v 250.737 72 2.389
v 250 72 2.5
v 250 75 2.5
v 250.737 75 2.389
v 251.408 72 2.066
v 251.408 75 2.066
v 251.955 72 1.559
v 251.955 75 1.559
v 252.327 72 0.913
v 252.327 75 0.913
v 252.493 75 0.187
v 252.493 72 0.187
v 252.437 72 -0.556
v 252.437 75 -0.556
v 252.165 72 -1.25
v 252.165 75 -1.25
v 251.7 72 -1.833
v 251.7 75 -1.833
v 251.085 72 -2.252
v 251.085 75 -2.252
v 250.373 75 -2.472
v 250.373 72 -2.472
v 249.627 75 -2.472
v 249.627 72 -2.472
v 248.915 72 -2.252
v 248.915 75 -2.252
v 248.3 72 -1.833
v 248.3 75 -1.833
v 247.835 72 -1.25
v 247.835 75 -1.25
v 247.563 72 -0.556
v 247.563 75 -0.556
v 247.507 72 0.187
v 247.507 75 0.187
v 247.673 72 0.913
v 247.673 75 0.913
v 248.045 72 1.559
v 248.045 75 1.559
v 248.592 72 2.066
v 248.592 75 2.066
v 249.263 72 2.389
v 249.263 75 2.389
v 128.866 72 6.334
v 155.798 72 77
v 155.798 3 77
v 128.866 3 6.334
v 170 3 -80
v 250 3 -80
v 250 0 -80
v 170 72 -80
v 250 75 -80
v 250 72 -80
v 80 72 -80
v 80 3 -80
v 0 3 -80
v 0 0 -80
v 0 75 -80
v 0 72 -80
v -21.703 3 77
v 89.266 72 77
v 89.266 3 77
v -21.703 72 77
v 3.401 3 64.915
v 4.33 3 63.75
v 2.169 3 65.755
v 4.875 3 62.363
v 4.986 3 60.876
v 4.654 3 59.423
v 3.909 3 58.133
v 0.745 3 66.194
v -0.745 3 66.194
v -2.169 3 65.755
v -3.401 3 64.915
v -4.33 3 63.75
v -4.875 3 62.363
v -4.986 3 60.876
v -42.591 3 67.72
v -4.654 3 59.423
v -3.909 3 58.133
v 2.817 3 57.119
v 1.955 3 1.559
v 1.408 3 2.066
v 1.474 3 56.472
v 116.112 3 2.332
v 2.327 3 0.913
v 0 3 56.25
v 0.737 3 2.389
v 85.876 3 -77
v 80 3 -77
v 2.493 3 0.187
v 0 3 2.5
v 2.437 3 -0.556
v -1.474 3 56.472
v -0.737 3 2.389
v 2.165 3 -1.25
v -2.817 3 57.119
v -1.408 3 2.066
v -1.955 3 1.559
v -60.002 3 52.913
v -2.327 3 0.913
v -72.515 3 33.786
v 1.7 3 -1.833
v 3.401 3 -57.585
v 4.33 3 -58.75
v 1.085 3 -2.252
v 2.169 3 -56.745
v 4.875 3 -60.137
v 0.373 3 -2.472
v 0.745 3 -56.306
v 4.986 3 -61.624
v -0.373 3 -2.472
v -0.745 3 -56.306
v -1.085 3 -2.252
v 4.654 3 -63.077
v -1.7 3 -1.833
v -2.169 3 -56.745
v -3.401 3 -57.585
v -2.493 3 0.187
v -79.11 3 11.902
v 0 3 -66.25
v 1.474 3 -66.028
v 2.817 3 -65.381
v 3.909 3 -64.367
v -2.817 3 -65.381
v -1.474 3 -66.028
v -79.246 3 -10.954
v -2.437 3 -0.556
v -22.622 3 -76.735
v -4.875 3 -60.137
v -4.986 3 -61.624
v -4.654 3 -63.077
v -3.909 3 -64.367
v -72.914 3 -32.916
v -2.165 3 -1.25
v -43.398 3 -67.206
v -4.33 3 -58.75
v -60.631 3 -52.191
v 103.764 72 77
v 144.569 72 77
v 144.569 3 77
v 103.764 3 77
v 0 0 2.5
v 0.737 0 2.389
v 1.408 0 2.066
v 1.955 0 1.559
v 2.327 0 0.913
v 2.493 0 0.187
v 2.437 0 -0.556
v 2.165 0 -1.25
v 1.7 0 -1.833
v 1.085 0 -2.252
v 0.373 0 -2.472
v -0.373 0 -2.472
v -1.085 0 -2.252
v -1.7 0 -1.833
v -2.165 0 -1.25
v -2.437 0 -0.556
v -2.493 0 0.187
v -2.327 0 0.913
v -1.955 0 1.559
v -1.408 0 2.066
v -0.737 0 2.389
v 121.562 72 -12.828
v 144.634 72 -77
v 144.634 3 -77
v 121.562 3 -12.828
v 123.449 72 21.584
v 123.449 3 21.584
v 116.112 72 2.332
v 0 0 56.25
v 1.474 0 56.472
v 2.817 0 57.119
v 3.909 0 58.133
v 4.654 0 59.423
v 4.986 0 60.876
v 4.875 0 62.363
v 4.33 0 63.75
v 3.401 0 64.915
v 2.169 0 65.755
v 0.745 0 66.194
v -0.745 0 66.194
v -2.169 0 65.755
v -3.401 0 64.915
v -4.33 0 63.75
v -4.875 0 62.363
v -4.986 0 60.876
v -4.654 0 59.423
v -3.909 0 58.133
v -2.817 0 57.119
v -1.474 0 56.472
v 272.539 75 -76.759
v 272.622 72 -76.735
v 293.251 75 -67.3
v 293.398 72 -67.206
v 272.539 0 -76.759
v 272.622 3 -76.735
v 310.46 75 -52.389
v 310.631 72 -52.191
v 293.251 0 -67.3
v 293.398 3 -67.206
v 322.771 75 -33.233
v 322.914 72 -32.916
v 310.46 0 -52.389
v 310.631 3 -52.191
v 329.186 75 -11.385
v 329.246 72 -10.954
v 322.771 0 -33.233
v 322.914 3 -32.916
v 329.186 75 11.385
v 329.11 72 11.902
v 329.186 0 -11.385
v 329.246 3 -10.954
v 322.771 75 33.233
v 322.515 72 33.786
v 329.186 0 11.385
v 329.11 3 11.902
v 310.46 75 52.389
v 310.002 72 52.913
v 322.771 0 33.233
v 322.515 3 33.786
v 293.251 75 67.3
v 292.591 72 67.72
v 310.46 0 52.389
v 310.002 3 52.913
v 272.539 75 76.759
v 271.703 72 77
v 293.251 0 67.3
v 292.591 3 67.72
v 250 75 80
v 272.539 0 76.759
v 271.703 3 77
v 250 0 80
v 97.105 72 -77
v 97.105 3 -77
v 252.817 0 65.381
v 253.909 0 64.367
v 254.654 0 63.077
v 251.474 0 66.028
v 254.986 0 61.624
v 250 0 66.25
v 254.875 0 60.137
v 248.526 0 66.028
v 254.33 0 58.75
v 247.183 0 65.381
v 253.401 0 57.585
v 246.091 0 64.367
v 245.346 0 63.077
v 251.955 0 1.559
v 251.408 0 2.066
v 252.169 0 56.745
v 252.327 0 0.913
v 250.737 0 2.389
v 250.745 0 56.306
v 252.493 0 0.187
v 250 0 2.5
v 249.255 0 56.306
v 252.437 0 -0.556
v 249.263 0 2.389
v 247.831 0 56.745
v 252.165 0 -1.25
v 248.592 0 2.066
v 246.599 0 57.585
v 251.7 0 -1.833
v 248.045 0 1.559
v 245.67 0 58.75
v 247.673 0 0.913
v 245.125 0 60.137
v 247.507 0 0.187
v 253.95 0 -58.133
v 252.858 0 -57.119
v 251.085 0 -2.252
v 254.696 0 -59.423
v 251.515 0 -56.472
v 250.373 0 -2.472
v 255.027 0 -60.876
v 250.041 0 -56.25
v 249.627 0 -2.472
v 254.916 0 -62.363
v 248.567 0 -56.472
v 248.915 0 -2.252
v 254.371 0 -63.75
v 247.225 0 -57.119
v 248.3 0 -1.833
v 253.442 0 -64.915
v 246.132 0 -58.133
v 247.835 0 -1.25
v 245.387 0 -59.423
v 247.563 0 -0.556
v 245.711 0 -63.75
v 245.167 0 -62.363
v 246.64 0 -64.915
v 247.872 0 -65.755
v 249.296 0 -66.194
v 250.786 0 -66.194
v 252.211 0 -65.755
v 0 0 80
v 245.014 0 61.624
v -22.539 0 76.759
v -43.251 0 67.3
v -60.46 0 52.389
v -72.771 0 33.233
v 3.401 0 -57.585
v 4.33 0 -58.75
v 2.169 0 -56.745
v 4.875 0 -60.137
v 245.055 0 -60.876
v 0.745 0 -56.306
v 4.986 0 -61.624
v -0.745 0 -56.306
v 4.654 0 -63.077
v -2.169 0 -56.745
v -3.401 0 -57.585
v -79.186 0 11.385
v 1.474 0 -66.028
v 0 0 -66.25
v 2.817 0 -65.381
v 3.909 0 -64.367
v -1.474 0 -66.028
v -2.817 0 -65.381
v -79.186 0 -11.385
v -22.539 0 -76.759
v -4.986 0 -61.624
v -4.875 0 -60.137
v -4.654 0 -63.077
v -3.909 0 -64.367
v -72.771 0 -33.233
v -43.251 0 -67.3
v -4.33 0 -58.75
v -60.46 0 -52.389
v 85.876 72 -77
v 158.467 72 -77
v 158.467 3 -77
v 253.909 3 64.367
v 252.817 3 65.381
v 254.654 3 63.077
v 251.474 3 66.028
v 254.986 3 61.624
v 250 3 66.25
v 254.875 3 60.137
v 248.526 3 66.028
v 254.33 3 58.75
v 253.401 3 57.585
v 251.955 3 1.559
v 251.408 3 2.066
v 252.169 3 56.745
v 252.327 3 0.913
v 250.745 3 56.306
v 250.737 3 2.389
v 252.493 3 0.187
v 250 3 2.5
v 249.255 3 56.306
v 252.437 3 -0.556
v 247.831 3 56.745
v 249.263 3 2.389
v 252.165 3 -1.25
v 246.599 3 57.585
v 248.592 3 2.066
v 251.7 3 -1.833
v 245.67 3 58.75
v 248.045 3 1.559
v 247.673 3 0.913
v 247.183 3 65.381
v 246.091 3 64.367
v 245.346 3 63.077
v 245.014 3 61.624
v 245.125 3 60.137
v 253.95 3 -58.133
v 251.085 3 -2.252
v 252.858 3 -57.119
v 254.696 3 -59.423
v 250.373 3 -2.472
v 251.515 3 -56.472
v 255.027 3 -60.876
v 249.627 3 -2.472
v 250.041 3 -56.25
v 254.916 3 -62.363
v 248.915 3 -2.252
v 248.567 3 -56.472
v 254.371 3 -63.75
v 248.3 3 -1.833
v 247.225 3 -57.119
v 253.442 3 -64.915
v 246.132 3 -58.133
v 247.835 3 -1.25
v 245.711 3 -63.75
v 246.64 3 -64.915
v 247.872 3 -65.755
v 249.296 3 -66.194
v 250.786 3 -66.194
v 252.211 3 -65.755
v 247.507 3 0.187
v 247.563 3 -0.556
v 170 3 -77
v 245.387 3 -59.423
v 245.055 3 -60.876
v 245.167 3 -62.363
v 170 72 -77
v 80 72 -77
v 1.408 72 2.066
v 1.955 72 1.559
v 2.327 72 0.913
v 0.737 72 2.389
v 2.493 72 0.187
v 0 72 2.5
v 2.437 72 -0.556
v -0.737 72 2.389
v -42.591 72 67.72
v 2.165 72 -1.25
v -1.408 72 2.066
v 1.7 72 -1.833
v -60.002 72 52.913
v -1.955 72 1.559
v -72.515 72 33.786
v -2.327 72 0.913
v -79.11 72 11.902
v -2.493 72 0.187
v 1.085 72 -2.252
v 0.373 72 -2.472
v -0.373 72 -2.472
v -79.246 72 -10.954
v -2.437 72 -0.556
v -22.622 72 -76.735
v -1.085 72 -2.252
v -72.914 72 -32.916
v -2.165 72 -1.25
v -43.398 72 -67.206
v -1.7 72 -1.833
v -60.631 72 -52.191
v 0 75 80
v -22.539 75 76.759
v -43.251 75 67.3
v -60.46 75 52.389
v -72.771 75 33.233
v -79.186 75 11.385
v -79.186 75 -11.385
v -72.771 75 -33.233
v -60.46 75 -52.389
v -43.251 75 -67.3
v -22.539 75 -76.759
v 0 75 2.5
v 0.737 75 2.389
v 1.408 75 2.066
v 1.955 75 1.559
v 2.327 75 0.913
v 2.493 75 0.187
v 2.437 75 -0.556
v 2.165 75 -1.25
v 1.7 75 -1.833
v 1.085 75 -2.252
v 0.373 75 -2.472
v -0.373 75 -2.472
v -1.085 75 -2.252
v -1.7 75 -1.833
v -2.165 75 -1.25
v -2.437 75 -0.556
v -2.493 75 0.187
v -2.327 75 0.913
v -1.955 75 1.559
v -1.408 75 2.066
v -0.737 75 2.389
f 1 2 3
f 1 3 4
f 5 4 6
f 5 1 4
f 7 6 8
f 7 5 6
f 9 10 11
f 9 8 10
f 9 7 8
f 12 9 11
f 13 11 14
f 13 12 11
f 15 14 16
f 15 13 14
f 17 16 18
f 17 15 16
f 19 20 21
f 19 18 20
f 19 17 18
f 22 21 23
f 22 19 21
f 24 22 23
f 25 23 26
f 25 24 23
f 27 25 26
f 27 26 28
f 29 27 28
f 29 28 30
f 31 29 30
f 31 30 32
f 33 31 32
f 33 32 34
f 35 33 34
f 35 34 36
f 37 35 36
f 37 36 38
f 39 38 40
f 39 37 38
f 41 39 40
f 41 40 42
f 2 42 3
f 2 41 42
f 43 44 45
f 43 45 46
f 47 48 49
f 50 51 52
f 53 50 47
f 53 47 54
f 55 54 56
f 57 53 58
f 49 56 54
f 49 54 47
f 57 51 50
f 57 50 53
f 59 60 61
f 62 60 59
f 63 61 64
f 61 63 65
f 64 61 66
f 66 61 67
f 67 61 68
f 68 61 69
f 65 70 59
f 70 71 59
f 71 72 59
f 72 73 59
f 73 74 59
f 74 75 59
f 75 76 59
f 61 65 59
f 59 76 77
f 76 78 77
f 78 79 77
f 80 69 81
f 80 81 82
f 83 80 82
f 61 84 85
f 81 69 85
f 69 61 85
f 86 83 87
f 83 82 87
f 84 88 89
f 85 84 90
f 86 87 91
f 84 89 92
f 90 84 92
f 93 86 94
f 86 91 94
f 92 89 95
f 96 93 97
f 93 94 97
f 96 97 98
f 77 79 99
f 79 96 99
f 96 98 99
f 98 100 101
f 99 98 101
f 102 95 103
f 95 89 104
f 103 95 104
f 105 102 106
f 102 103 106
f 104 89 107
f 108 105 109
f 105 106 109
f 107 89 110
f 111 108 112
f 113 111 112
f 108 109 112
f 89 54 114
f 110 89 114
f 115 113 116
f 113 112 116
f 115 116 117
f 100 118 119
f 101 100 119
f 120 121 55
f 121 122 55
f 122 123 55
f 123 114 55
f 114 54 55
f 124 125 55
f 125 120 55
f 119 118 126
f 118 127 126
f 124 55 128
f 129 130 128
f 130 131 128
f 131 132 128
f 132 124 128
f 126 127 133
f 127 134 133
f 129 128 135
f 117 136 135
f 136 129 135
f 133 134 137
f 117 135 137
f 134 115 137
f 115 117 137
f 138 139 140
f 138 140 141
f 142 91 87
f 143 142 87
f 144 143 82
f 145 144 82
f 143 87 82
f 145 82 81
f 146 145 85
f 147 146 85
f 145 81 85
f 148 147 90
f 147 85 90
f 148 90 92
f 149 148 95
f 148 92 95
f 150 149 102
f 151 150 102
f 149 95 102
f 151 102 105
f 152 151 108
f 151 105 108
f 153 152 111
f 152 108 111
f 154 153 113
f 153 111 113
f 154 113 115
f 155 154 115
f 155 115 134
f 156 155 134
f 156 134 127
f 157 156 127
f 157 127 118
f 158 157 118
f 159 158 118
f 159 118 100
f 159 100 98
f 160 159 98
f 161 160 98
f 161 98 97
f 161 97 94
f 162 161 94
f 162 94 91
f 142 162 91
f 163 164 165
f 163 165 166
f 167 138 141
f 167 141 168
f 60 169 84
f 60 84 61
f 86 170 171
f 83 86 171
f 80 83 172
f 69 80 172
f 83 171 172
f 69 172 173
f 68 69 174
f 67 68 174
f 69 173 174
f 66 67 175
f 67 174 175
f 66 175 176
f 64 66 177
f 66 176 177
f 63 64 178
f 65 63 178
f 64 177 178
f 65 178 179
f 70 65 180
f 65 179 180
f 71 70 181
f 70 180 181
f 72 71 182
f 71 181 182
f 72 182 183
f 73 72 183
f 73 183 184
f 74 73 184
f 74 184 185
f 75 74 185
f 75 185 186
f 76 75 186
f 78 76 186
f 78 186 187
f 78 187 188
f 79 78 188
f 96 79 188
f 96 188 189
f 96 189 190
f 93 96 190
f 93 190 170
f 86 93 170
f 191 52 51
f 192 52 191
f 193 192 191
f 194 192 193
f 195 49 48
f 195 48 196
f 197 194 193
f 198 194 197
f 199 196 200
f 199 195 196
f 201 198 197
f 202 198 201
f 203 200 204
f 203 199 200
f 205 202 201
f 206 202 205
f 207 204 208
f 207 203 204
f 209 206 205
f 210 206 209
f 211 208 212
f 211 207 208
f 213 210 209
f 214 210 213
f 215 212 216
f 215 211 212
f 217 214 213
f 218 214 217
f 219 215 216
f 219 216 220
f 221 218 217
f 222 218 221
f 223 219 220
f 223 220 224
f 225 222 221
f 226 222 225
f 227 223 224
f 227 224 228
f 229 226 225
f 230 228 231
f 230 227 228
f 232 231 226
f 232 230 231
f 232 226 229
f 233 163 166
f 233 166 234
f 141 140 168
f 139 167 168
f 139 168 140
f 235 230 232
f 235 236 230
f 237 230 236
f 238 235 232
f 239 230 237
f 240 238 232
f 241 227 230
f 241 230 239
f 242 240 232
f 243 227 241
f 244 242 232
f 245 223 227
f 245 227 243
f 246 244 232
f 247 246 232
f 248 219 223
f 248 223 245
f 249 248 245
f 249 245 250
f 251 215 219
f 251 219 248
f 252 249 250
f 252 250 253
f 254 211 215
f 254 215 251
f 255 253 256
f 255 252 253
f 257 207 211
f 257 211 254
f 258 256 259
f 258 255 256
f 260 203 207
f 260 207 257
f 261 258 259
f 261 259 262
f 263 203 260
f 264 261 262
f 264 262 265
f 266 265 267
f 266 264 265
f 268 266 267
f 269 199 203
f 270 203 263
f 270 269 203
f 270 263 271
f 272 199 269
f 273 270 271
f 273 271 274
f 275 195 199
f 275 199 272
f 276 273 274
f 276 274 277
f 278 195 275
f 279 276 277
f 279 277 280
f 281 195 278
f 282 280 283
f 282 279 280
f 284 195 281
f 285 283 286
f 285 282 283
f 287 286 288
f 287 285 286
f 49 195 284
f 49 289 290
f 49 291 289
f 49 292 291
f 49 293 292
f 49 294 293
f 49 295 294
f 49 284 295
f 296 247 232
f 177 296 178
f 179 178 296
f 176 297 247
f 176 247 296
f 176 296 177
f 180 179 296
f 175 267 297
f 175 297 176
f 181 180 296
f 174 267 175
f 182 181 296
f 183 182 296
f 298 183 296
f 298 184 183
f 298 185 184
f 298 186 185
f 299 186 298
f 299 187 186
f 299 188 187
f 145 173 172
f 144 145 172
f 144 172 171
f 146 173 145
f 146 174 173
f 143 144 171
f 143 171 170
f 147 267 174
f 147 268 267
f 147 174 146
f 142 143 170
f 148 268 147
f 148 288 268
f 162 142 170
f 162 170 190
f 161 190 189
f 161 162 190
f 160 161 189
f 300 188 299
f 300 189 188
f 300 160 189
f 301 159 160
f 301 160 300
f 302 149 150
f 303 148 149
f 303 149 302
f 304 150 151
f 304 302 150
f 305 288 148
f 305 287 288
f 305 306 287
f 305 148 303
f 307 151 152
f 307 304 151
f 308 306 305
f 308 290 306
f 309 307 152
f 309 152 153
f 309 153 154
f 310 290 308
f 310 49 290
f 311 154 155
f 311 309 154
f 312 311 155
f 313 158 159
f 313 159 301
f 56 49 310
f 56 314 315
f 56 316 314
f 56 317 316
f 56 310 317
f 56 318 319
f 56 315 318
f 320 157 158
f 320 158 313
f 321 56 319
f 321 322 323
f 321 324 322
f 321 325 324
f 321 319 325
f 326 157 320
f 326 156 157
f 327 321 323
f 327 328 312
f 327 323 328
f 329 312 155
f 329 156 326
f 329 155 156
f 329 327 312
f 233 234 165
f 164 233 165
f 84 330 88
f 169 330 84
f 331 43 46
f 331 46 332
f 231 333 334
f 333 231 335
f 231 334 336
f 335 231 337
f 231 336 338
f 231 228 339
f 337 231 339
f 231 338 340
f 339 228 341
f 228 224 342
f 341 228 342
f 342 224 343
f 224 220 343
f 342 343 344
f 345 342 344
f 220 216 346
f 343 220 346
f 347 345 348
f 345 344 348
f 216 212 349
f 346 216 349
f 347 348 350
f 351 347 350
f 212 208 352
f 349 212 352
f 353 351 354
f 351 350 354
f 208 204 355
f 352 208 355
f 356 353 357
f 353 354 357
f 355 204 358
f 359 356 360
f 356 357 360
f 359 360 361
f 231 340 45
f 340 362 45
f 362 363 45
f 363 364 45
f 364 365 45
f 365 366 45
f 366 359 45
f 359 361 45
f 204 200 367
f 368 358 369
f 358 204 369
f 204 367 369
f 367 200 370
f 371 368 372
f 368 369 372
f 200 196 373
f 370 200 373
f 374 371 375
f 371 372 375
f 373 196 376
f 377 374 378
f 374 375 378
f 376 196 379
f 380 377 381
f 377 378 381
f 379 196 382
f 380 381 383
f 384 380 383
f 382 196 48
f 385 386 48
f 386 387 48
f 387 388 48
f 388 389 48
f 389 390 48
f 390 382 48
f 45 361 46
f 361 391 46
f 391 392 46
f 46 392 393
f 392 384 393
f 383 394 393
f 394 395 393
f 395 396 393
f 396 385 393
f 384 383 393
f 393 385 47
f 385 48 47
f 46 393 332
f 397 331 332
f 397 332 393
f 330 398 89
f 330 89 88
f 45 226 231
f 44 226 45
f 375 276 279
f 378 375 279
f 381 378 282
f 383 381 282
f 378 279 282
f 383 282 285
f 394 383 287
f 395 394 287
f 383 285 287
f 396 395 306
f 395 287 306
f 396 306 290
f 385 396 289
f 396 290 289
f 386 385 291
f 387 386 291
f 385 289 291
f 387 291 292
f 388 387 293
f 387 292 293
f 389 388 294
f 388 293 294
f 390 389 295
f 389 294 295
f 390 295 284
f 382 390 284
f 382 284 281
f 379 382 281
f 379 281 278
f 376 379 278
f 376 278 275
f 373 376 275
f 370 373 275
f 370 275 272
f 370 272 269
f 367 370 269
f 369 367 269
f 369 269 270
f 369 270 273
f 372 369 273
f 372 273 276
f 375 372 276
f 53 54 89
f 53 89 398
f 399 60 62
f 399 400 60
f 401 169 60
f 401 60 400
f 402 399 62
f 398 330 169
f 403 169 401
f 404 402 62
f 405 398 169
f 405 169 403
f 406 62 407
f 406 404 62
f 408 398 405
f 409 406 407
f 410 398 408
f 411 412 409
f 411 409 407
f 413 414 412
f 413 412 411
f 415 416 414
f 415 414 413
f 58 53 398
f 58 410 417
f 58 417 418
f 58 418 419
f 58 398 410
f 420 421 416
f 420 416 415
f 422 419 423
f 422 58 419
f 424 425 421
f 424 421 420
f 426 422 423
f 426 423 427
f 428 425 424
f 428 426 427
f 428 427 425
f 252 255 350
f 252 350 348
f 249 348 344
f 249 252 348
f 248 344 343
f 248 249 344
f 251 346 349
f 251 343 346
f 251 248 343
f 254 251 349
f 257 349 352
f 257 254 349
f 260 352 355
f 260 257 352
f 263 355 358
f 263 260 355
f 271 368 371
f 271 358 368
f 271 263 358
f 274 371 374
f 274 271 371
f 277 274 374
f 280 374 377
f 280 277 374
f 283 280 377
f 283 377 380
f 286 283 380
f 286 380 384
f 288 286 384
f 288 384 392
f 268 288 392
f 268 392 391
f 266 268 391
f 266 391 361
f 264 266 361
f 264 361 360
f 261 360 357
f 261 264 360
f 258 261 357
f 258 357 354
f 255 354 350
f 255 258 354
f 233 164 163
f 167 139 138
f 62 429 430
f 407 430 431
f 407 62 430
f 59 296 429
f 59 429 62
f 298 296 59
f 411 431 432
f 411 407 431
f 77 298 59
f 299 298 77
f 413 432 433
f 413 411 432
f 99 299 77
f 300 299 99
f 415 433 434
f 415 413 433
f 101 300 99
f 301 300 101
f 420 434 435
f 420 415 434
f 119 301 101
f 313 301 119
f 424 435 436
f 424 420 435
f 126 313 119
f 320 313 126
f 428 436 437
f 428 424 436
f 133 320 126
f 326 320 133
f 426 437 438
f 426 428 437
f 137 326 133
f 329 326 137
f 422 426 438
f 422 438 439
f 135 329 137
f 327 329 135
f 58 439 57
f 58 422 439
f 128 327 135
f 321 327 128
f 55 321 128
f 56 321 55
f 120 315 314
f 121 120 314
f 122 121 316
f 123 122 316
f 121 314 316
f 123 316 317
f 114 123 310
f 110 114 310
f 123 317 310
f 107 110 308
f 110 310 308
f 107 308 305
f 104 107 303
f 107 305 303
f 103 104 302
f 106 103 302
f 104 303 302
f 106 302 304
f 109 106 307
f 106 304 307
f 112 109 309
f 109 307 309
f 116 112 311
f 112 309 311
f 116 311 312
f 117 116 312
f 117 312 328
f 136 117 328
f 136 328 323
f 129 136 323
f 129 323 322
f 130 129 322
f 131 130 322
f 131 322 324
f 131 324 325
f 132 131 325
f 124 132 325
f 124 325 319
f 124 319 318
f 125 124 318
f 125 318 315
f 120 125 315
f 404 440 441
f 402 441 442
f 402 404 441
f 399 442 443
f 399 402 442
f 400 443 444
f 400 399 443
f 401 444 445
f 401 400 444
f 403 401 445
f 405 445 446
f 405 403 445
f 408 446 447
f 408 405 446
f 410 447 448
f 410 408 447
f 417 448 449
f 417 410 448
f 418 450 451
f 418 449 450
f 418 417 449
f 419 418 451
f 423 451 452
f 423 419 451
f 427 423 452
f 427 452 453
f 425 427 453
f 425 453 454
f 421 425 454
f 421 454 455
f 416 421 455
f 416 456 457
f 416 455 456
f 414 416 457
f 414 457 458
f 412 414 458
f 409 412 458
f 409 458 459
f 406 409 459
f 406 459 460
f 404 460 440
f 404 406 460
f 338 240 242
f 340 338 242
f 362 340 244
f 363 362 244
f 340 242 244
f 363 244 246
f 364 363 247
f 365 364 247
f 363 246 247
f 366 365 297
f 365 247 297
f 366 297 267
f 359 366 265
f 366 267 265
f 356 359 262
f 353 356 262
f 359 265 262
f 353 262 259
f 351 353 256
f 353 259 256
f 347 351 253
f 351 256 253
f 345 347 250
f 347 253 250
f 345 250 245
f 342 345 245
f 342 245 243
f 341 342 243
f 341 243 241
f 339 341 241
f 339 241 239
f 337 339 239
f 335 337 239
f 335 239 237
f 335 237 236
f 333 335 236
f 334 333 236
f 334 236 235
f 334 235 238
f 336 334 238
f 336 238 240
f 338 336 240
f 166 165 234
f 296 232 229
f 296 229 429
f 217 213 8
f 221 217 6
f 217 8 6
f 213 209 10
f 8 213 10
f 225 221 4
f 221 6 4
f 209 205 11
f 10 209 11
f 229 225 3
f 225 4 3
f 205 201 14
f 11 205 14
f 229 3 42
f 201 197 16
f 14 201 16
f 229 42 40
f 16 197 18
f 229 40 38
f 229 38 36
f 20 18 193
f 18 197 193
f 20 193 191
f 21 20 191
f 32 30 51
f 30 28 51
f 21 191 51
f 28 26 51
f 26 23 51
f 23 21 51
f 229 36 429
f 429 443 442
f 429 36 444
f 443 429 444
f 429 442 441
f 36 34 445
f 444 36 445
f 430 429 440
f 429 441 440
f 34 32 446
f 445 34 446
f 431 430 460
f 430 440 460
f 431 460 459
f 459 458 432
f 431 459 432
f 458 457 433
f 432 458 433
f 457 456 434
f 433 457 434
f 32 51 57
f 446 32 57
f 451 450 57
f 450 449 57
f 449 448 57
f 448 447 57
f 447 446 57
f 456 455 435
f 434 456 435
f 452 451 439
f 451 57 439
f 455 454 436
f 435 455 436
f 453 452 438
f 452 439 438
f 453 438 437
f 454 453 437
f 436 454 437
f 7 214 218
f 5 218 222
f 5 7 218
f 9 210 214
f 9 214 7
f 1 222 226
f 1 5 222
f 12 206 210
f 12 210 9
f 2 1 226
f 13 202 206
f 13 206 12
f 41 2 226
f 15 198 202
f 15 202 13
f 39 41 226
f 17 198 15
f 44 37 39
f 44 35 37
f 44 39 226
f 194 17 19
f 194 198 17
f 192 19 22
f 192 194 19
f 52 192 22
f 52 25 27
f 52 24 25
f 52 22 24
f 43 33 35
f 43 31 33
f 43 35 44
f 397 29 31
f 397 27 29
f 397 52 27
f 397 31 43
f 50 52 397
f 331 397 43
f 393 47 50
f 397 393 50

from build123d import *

# Parameters (mm, degrees)
EXTRUDE_1_DEPTH                  = 75
CUT_EXTRUDE_1_DEPTH              = 69
SKETCH_4_W                       = 160
SKETCH_4_H                       = 69
CUT_EXTRUDE_2_DEPTH              = 157
SKETCH_5_R                       = 2.5
CUT_EXTRUDE_3_DEPTH              = 348.108052341
CUT_EXTRUDE_16_REACH             = 349.108
SKETCH_6_R                       = 2.5
CUT_EXTRUDE_18_REACH             = 349.743
SKETCH_8_R                       = 5
CUT_EXTRUDE_19_REACH             = 349.743
SKETCH_9_R                       = 5
CUT_EXTRUDE_20_DEPTH             = 348.742720988
CUT_EXTRUDE_20_DEPTH_BACK        = 348.742720988
SKETCH_10_R                      = 2.5
CUT_EXTRUDE_21_REACH             = 349.743
SKETCH_11_R                      = 5
CUT_EXTRUDE_21_DIRECTION_2_DEPTH = 348.742720988
EXTRUDE_2_DEPTH                  = 69


with BuildPart() as part:
    # 草图1 → 凸台-拉伸1 (new body)
    with BuildSketch(Plane(origin=(0, 0, 0), x_dir=(1, 0, 0), z_dir=(0, 1, 0))):
        with BuildLine():
            Line((0, 80), (250, 80))
            ThreePointArc((250, 80), (330, 0), (250, -80))
            Line((250, -80), (0, -80))
            ThreePointArc((0, -80), (-80, 0), (0, 80))
        make_face()
    extrude(amount=EXTRUDE_1_DEPTH)

    # 草图3 → 切除-拉伸1 (cut)
    with BuildSketch(Plane(origin=(0, 72, 0), x_dir=(1, 0, 0), z_dir=(0, 1, 0))):
        with BuildLine():
            Line((0, 77), (250, 77))
            ThreePointArc((250, 77), (327, 0), (250, -77))
            Line((250, -77), (0, -77))
            ThreePointArc((0, -77), (-77, 0), (0, 77))
        make_face()
    extrude(amount=-CUT_EXTRUDE_1_DEPTH, mode=Mode.SUBTRACT)

    # 草图4 → 切除-拉伸2 (cut)
    with BuildSketch(Plane(origin=(0, 0, -80), x_dir=(-1, 0, 0), z_dir=(0, 0, -1))):
        with Locations((0, 37.5)):
            Rectangle(SKETCH_4_W, SKETCH_4_H)
        with Locations((-250, 37.5)):
            Rectangle(SKETCH_4_W, SKETCH_4_H)
    extrude(amount=-CUT_EXTRUDE_2_DEPTH, mode=Mode.SUBTRACT)

    # 草图5 → 切除-拉伸3 (cut, through all)
    with BuildSketch(Plane(origin=(0, 3, 0), x_dir=(1, 0, 0), z_dir=(0, 1, 0))):
        with Locations(Location((0, 0, 0), (0, 0, 270))):
            Circle(SKETCH_5_R)
    extrude(amount=-CUT_EXTRUDE_3_DEPTH, mode=Mode.SUBTRACT)

    # 草图6 → 切除-拉伸16 (cut, up to next)
    with BuildSketch(Plane(origin=(0, 72, 0), x_dir=(1, 0, 0), z_dir=(0, 1, 0)), mode=Mode.PRIVATE) as cut_extrude_16_sk1:
        with Locations(Location((0, 0, 0), (0, 0, 270))):
            Circle(SKETCH_6_R)
    cut_extrude_16_tool1 = extrude(cut_extrude_16_sk1.sketch, amount=CUT_EXTRUDE_16_REACH, mode=Mode.PRIVATE) & part.part
    add(cut_extrude_16_tool1.solids().sort_by_distance((0, 72, 0))[0], mode=Mode.SUBTRACT)

    # 草图8 → 切除-拉伸18 (cut, up to next)
    with BuildSketch(Plane(origin=(0, 0, 0), x_dir=(-1, 0, 0), z_dir=(0, -1, 0)), mode=Mode.PRIVATE) as cut_extrude_18_sk1:
        with Locations(Location((0, -61.25, 0), (0, 0, 90))):
            Circle(SKETCH_8_R)
    cut_extrude_18_tool1 = extrude(cut_extrude_18_sk1.sketch, amount=-CUT_EXTRUDE_18_REACH, mode=Mode.PRIVATE) & part.part
    add(cut_extrude_18_tool1.solids().sort_by_distance((0, 0, 61.25))[0], mode=Mode.SUBTRACT)

    # 草图9 → 切除-拉伸19 (cut, up to next)
    with BuildSketch(Plane.XZ, mode=Mode.PRIVATE) as cut_extrude_19_sk1:
        with Locations(Location((0, -61.25, 0), (0, 0, 270))):
            Circle(SKETCH_9_R)
    cut_extrude_19_tool1 = extrude(cut_extrude_19_sk1.sketch, amount=-CUT_EXTRUDE_19_REACH, mode=Mode.PRIVATE) & part.part
    add(cut_extrude_19_tool1.solids().sort_by_distance((0, 0, -61.25))[0], mode=Mode.SUBTRACT)

    # 草图10 → 切除-拉伸20 (cut, two sides: drawn at the far end of the back side and taken through both)
    with BuildSketch(Plane(origin=(0, 75, 0), x_dir=(1, 0, 0), z_dir=(0, 1, 0)).offset(-CUT_EXTRUDE_20_DEPTH_BACK)):
        with Locations(Location((250, 0, 0), (0, 0, 270))):
            Circle(SKETCH_10_R)
    extrude(amount=CUT_EXTRUDE_20_DEPTH + CUT_EXTRUDE_20_DEPTH_BACK, mode=Mode.SUBTRACT)

    # 草图11 → 切除-拉伸21 (cut, up to next)
    with BuildSketch(Plane.XZ, mode=Mode.PRIVATE) as cut_extrude_21_sk1:
        with Locations(Location((250, 61.25, 0), (0, 0, 90))):
            Circle(SKETCH_11_R)
    cut_extrude_21_tool1 = extrude(cut_extrude_21_sk1.sketch, amount=-CUT_EXTRUDE_21_REACH, mode=Mode.PRIVATE) & part.part
    # 草图11 → 切除-拉伸21 (cut, up to next)
    with BuildSketch(Plane.XZ, mode=Mode.PRIVATE) as cut_extrude_21_sk2:
        with Locations(Location((250.041254048, -61.25, 0), (0, 0, 90))):
            Circle(SKETCH_11_R)
    cut_extrude_21_tool2 = extrude(cut_extrude_21_sk2.sketch, amount=-CUT_EXTRUDE_21_REACH, mode=Mode.PRIVATE) & part.part
    add(cut_extrude_21_tool1.solids().sort_by_distance((250, 0, 61.25))[0], mode=Mode.SUBTRACT)
    add(cut_extrude_21_tool2.solids().sort_by_distance((250.041254, 0, -61.25))[0], mode=Mode.SUBTRACT)

    # 草图11 → 切除-拉伸21 direction 2 (cut)
    with BuildSketch(Plane.XZ):
        with Locations(Location((250, 61.25, 0), (0, 0, 90))):
            Circle(SKETCH_11_R)
        with Locations(Location((250.041254048, -61.25, 0), (0, 0, 90))):
            Circle(SKETCH_11_R)
    extrude(amount=CUT_EXTRUDE_21_DIRECTION_2_DEPTH, mode=Mode.SUBTRACT)

    # 草图12 → 凸台-拉伸2 (add)
    with BuildSketch(Plane(origin=(0, 72, 0), x_dir=(1, 0, 0), z_dir=(0, 1, 0))):
        Polygon((84.732642754, 80), (116.111672897, -2.332361516), (88.187612247, -80), (102.698484118, -80), (123.448818124, -21.583577713), (145.712854307, -80), (156.94150516, -80), (128.865571981, -6.33431085), (159.53273228, 80), (145.712854307, 80), (121.562315366, 12.827988338), (95.961293606, 80), align=None)
    extrude(amount=-EXTRUDE_2_DEPTH)


solid = part.part
